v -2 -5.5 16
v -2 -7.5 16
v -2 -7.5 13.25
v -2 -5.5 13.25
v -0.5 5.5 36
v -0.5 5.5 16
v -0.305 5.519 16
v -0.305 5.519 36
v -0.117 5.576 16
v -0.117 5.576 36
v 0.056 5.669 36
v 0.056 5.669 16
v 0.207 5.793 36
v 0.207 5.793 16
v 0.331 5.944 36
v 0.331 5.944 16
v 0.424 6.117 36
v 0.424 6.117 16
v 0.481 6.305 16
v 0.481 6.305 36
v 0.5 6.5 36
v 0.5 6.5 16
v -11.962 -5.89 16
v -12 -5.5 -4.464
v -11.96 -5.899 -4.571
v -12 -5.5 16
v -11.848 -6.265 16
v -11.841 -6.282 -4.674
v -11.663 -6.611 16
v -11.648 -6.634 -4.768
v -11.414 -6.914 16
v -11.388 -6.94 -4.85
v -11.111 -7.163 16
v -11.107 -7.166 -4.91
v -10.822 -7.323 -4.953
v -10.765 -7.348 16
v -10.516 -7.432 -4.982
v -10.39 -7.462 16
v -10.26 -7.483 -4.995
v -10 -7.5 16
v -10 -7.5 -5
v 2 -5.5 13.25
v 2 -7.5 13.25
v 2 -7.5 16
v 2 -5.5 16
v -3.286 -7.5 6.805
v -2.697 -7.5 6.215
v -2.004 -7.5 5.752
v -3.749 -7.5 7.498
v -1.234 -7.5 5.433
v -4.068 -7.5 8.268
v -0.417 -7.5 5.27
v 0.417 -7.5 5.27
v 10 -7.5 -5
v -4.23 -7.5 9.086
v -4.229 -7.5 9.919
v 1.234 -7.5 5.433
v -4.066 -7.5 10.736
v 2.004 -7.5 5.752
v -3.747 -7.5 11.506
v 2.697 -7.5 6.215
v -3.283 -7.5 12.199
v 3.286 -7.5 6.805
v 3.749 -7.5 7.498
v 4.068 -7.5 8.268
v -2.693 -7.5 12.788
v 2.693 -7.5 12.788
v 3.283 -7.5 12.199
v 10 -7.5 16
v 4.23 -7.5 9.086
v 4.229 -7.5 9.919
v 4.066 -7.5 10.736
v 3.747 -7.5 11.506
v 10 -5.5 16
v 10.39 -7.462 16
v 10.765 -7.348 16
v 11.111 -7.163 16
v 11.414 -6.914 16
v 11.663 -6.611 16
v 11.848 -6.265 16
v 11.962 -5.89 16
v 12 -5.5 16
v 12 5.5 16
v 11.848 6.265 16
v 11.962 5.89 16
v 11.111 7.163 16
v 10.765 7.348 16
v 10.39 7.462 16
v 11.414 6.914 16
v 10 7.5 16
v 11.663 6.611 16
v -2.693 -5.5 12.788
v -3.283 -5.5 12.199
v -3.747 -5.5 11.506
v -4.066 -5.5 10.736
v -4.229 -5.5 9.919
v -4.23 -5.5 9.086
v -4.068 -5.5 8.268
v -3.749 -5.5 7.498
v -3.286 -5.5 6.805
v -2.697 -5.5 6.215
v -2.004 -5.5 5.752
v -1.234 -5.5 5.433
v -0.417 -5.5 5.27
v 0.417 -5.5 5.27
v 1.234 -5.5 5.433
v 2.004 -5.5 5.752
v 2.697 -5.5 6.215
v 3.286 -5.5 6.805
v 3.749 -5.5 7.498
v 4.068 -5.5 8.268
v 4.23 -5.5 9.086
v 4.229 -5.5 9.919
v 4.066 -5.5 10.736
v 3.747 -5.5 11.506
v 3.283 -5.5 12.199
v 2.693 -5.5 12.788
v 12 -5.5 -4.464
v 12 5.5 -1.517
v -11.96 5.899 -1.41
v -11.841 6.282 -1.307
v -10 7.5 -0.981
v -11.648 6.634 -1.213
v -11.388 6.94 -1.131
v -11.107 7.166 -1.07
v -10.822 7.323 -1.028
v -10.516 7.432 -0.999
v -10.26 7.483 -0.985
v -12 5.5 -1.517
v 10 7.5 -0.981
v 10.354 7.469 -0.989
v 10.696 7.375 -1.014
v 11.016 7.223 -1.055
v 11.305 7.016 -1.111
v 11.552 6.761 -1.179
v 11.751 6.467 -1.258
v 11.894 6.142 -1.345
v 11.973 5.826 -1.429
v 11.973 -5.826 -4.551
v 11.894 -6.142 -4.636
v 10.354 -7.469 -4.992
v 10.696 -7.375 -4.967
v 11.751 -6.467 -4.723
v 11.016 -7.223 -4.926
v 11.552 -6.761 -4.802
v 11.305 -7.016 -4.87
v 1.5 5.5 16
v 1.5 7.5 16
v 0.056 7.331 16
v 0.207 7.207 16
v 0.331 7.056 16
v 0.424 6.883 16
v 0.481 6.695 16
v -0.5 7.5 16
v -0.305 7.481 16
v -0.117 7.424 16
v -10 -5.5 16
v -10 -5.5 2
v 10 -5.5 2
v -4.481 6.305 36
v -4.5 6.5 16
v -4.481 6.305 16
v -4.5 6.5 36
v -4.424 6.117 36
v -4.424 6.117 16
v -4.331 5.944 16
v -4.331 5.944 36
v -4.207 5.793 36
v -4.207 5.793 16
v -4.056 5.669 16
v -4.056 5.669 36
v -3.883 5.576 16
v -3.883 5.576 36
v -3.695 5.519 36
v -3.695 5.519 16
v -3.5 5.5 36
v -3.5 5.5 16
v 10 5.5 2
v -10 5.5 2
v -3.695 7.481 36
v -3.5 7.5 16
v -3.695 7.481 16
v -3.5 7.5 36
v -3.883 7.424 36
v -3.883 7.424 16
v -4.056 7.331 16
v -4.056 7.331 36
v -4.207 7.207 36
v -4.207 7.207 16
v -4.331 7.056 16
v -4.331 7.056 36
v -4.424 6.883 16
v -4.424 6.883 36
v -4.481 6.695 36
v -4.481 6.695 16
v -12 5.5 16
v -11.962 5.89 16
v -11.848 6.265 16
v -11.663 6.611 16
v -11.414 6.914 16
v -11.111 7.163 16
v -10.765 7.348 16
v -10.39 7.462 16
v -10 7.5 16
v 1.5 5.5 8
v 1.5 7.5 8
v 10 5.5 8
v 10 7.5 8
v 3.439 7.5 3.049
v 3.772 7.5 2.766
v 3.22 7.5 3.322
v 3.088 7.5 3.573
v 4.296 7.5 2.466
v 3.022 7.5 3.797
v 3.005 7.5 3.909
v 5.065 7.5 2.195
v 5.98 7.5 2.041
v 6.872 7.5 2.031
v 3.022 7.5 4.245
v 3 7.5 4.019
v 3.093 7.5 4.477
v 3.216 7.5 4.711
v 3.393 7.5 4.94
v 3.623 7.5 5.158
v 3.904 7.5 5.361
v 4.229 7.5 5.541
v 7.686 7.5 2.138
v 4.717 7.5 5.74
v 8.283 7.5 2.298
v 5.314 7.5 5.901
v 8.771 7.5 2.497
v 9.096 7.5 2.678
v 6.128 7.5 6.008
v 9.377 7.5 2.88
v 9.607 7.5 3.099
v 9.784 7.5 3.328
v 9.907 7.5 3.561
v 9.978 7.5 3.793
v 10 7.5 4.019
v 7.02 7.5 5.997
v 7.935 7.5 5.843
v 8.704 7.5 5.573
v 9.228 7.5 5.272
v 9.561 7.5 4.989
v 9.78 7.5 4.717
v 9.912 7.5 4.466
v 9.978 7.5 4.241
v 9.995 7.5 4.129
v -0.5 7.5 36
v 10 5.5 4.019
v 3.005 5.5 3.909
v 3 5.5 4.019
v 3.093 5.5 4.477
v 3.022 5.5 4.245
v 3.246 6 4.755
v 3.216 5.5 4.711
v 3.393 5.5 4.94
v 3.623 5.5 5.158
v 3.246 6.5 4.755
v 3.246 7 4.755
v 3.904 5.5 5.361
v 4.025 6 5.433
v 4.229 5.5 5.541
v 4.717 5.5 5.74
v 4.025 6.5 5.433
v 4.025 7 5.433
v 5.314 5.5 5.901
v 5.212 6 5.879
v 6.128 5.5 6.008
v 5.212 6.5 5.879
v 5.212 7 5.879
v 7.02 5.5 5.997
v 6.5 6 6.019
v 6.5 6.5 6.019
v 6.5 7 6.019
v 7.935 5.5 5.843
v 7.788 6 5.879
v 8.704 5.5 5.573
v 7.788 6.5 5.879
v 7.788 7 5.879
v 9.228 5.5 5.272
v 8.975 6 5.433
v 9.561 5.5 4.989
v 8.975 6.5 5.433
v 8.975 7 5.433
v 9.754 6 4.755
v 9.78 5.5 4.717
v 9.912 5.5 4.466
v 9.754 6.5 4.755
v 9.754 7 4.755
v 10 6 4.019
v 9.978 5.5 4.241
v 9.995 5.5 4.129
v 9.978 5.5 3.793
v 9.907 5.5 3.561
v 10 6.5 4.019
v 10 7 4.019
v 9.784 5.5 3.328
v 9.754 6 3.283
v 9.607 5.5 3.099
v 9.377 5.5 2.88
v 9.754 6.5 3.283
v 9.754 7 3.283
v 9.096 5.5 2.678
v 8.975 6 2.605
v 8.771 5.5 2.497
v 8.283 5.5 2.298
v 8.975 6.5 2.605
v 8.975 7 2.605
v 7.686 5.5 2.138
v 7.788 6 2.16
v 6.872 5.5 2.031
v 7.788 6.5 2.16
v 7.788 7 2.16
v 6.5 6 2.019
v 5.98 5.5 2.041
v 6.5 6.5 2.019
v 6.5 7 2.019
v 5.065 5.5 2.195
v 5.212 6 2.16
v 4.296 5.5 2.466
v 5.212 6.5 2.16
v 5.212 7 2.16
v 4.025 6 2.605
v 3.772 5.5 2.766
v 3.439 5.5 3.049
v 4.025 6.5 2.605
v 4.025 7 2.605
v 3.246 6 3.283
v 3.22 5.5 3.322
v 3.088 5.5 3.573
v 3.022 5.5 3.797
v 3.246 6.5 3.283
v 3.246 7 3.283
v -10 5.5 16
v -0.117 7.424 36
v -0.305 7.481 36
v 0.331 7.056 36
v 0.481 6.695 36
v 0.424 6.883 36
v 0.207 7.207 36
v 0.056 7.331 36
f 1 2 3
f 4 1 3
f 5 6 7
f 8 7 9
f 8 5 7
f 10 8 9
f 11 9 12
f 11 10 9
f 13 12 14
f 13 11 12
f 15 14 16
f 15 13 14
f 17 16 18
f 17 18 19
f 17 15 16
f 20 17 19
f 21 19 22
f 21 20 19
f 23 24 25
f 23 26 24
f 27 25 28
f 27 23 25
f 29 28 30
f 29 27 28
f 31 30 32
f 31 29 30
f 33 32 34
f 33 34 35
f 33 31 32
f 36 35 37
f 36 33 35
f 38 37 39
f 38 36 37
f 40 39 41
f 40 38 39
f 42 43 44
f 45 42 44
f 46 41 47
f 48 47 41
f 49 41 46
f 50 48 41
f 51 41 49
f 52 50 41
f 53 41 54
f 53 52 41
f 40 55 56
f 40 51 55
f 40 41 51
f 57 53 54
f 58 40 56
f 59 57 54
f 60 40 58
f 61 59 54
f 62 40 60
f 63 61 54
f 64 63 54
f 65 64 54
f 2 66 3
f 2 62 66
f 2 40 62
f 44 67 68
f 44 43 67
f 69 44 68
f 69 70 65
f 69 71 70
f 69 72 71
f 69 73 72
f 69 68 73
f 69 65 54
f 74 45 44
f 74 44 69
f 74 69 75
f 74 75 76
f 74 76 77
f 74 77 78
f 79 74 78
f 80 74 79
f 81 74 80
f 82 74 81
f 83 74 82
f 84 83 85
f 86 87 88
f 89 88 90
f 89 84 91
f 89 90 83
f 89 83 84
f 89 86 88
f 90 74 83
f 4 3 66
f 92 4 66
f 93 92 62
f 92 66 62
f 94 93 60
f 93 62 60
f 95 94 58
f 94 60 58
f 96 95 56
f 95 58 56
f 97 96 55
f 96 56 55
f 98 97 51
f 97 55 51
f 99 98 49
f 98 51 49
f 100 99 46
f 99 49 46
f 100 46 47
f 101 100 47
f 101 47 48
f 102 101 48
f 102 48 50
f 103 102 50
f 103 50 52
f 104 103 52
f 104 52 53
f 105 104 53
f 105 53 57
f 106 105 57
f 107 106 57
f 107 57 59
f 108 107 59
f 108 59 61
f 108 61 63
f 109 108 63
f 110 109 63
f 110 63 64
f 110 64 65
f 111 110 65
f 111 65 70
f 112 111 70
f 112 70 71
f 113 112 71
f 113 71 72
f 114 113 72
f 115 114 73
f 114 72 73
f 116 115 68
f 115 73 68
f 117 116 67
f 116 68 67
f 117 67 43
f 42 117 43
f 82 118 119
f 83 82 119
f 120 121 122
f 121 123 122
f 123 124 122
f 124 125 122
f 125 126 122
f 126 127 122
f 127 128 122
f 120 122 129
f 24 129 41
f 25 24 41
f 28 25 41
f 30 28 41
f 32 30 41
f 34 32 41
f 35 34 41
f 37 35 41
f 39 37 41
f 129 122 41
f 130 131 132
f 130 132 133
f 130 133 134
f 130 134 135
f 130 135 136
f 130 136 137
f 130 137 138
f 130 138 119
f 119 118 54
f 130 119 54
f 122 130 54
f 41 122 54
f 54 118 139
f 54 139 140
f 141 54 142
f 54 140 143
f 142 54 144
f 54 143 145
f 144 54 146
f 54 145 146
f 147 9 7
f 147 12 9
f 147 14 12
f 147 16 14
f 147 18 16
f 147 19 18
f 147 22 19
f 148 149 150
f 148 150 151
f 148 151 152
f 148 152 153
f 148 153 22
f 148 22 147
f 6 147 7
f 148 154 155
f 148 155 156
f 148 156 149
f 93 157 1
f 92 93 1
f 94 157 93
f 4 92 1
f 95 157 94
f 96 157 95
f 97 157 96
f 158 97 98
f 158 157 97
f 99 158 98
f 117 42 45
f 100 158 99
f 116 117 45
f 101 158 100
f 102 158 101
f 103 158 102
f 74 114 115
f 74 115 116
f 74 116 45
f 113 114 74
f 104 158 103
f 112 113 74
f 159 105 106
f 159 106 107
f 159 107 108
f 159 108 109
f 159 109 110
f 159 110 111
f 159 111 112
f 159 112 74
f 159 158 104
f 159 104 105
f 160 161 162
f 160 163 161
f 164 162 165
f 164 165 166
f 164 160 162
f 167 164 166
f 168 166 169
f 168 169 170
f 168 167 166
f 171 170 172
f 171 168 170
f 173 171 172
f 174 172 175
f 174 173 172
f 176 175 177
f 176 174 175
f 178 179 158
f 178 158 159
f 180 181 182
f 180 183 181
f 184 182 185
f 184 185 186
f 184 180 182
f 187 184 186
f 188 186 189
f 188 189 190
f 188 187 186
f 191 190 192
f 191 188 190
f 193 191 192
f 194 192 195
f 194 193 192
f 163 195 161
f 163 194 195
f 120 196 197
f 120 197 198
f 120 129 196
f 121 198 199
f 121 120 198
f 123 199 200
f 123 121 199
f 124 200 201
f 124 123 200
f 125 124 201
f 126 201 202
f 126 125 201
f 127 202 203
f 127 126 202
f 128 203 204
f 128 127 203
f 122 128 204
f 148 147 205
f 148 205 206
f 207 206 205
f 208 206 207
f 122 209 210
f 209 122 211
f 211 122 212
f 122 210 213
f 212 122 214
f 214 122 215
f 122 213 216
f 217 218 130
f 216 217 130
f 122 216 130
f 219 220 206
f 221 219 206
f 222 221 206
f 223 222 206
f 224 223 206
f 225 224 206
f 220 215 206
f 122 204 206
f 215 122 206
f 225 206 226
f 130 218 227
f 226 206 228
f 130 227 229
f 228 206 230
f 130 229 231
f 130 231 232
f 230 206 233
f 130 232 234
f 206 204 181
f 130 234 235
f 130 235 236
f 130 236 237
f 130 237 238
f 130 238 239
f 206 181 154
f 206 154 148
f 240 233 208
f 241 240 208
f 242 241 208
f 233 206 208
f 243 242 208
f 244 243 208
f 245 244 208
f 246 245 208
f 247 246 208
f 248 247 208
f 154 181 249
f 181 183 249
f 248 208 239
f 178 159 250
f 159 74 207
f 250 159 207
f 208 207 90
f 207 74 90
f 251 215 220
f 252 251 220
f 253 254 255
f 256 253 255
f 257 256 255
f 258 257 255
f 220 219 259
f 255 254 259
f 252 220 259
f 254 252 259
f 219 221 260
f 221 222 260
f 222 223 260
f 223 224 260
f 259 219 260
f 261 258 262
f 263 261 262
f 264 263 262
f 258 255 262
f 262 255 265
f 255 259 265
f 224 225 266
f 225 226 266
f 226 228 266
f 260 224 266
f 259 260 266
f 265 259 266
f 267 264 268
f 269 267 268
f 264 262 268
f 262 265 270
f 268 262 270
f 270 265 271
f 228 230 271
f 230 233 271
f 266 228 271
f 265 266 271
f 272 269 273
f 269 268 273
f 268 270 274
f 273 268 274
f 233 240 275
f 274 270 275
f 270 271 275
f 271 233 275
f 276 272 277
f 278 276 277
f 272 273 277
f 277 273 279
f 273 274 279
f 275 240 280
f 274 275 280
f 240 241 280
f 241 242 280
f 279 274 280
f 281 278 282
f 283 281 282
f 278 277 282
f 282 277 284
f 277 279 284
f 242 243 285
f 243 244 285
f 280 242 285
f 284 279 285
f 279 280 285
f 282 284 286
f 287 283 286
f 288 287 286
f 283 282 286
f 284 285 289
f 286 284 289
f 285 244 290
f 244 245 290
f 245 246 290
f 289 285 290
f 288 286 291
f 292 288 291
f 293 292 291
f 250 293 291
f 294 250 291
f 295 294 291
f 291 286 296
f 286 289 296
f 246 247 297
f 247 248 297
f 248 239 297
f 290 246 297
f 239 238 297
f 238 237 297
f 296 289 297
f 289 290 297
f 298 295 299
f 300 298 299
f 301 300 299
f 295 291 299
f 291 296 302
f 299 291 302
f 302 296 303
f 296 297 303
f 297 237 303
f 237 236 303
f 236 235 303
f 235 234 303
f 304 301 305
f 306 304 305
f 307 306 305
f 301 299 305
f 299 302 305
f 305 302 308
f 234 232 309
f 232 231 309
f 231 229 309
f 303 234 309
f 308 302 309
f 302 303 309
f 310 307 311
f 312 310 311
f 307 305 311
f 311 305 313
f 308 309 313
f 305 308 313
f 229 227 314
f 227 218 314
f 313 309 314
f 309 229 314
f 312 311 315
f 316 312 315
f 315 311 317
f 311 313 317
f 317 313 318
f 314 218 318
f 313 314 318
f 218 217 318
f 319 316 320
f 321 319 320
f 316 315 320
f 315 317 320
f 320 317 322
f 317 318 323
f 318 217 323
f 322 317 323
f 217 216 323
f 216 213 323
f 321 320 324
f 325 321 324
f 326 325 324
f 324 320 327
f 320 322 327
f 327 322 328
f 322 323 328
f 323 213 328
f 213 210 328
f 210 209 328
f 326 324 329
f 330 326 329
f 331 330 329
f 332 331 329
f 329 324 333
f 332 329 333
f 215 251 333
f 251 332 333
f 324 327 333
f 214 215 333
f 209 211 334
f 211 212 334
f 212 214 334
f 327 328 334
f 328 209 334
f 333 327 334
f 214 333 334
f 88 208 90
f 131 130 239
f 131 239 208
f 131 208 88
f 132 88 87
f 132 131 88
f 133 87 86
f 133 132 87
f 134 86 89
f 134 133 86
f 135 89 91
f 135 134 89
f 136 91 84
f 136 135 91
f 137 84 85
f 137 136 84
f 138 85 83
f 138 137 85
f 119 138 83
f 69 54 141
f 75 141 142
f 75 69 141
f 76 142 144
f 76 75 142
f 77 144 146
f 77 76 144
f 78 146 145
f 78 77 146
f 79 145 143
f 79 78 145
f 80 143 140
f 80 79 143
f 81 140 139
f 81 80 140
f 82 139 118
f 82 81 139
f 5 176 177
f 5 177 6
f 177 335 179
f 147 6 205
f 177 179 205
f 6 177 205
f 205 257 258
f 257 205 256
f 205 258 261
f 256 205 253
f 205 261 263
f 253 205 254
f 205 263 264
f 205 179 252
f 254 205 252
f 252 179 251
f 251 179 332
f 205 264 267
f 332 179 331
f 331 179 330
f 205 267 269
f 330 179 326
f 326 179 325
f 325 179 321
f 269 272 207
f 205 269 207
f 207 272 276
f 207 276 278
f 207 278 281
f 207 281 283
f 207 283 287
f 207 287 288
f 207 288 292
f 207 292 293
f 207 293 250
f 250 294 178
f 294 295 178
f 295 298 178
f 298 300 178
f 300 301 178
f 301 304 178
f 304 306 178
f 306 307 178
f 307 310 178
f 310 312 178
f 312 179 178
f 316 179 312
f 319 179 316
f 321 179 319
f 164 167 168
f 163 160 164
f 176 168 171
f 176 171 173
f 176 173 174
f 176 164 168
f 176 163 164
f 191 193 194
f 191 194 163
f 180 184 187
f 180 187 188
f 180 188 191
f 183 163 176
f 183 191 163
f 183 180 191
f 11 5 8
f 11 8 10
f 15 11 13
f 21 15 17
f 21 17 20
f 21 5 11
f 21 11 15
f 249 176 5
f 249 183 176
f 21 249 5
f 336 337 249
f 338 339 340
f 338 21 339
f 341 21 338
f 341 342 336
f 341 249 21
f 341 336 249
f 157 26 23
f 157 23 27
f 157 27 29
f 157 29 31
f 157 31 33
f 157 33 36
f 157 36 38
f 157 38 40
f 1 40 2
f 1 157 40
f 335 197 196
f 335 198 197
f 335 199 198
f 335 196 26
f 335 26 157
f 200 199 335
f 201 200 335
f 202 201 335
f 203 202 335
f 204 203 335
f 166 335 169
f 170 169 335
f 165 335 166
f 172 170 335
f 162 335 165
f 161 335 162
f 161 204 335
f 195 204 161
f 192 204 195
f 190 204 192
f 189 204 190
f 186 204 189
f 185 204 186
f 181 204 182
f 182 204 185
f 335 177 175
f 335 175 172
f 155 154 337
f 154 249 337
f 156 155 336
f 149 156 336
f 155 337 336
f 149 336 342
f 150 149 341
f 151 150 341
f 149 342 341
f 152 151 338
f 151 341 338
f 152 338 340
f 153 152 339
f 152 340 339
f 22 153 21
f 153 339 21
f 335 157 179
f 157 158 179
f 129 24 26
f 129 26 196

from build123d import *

# Parameters (mm, degrees)
F0_W      = 24
F0_H      = 15
F1_DEPTH  = 16
F2_T      = -2
F4_DEPTH  = 5
F5_W      = 5
F5_H      = 2
F6_DEPTH  = 20
F7_R      = 0.99999
F8_W      = 8.5
F8_H      = 2
F9_DEPTH  = 8
F10_DEPTH = 5
F12_DEPTH = 25
F13_R     = 2
F15_DEPTH = 2


# Not quite as in the source:
# - a fillet or chamfer is up to 0.001 mm smaller than in the source, because OpenCascade refuses the exact size


with BuildPart() as f1:
    # F0 (on Top) → F1 (new body)
    with BuildSketch(Plane.XY):
        Rectangle(F0_W, F0_H)
    extrude(amount=F1_DEPTH)

    # F2
    f2_openings = [f1.faces().sort_by_distance(p)[0] for p in [
        (0, 0, 16),
    ]]
    offset(amount=F2_T, openings=f2_openings)

    # F3 (on face) → F4 (cut)
    with BuildSketch(Plane.XZ.offset(7.5)):
        with BuildLine():
            Line((-2, 16), (-2, 13.25))
            ThreePointArc((-2, 13.25), (0, 5.25), (2, 13.25))
            Line((2, 13.25), (2, 16))
            Line((2, 16), (-2, 16))
        make_face()
    extrude(amount=-F4_DEPTH, mode=Mode.SUBTRACT)

    # F5 (on face) → F6 (join)
    with BuildSketch(Plane.XY.offset(16)):
        with Locations((-2, 6.5)):
            Rectangle(F5_W, F5_H)
    extrude(amount=F6_DEPTH)

    # F7 (radius 1 in the source; OpenCascade refuses exactly that, so slightly less here)
    f7_edges = [f1.edges().sort_by_distance(p)[0] for p in [
        (0.5, 5.5, 26),
        (0.5, 7.5, 26),
        (-4.5, 5.5, 26),
        (-4.5, 7.5, 26),
    ]]
    fillet(f7_edges, radius=F7_R)

    # F8 (on face) → F9 (cut)
    with BuildSketch(Plane.XY.offset(16)):
        with Locations((5.75, 6.5)):
            Rectangle(F8_W, F8_H)
    extrude(amount=-F9_DEPTH, mode=Mode.SUBTRACT)

    # F10 (add): a face of the model
    f10_faces = [f1.faces().sort_by_distance(p)[0] for p in [
        (0, 0, 0),
    ]]
    extrude(f10_faces, amount=F10_DEPTH)

    # F11 (on face) → F12 (cut)
    with BuildSketch(Plane.YZ.offset(12)):
        Polygon((7.5, -0.9807621135), (-7.5, -5), (7.5, -5), align=None)
    extrude(amount=-F12_DEPTH, mode=Mode.SUBTRACT)

    # F13
    f13_edges = [f1.edges().sort_by_distance(p)[0] for p in [
        (12, -7.5, 5.5),
        (-12, -7.5, 5.5),
        (-12, 7.5, 7.509619),
        (12, 7.5, 7.509619),
    ]]
    fillet(f13_edges, radius=F13_R)

    # F14 (on face) → F15 (cut)
    with BuildSketch(Plane(origin=(0, 7.5, 0), x_dir=(-1, 0, 0), z_dir=(0, 1, 0))):
        with BuildLine():
            add(Edge.make_bspline(
                [(-10, 4.0192378865), (-10, 2.0192378865), (-6.5, 2.0192378865), (-3, 2.0192378865), (-3, 4.0192378865)],
                knots=[3.1415926536, 3.1415926536, 3.1415926536, 4.7123889804, 4.7123889804, 6.2831853072, 6.2831853072, 6.2831853072], degree=2, weights=[1, 0.7071067812, 1, 0.7071067812, 1]))
            add(Edge.make_bspline(
                [(-3, 4.0192378865), (-3, 6.0192378865), (-6.5, 6.0192378865), (-10, 6.0192378865), (-10, 4.0192378865)],
                knots=[0, 0, 0, 1.5707963268, 1.5707963268, 3.1415926536, 3.1415926536, 3.1415926536], degree=2, weights=[1, 0.7071067812, 1, 0.7071067812, 1]))
        make_face()
    extrude(amount=-F15_DEPTH, mode=Mode.SUBTRACT)


solid = f1.part
